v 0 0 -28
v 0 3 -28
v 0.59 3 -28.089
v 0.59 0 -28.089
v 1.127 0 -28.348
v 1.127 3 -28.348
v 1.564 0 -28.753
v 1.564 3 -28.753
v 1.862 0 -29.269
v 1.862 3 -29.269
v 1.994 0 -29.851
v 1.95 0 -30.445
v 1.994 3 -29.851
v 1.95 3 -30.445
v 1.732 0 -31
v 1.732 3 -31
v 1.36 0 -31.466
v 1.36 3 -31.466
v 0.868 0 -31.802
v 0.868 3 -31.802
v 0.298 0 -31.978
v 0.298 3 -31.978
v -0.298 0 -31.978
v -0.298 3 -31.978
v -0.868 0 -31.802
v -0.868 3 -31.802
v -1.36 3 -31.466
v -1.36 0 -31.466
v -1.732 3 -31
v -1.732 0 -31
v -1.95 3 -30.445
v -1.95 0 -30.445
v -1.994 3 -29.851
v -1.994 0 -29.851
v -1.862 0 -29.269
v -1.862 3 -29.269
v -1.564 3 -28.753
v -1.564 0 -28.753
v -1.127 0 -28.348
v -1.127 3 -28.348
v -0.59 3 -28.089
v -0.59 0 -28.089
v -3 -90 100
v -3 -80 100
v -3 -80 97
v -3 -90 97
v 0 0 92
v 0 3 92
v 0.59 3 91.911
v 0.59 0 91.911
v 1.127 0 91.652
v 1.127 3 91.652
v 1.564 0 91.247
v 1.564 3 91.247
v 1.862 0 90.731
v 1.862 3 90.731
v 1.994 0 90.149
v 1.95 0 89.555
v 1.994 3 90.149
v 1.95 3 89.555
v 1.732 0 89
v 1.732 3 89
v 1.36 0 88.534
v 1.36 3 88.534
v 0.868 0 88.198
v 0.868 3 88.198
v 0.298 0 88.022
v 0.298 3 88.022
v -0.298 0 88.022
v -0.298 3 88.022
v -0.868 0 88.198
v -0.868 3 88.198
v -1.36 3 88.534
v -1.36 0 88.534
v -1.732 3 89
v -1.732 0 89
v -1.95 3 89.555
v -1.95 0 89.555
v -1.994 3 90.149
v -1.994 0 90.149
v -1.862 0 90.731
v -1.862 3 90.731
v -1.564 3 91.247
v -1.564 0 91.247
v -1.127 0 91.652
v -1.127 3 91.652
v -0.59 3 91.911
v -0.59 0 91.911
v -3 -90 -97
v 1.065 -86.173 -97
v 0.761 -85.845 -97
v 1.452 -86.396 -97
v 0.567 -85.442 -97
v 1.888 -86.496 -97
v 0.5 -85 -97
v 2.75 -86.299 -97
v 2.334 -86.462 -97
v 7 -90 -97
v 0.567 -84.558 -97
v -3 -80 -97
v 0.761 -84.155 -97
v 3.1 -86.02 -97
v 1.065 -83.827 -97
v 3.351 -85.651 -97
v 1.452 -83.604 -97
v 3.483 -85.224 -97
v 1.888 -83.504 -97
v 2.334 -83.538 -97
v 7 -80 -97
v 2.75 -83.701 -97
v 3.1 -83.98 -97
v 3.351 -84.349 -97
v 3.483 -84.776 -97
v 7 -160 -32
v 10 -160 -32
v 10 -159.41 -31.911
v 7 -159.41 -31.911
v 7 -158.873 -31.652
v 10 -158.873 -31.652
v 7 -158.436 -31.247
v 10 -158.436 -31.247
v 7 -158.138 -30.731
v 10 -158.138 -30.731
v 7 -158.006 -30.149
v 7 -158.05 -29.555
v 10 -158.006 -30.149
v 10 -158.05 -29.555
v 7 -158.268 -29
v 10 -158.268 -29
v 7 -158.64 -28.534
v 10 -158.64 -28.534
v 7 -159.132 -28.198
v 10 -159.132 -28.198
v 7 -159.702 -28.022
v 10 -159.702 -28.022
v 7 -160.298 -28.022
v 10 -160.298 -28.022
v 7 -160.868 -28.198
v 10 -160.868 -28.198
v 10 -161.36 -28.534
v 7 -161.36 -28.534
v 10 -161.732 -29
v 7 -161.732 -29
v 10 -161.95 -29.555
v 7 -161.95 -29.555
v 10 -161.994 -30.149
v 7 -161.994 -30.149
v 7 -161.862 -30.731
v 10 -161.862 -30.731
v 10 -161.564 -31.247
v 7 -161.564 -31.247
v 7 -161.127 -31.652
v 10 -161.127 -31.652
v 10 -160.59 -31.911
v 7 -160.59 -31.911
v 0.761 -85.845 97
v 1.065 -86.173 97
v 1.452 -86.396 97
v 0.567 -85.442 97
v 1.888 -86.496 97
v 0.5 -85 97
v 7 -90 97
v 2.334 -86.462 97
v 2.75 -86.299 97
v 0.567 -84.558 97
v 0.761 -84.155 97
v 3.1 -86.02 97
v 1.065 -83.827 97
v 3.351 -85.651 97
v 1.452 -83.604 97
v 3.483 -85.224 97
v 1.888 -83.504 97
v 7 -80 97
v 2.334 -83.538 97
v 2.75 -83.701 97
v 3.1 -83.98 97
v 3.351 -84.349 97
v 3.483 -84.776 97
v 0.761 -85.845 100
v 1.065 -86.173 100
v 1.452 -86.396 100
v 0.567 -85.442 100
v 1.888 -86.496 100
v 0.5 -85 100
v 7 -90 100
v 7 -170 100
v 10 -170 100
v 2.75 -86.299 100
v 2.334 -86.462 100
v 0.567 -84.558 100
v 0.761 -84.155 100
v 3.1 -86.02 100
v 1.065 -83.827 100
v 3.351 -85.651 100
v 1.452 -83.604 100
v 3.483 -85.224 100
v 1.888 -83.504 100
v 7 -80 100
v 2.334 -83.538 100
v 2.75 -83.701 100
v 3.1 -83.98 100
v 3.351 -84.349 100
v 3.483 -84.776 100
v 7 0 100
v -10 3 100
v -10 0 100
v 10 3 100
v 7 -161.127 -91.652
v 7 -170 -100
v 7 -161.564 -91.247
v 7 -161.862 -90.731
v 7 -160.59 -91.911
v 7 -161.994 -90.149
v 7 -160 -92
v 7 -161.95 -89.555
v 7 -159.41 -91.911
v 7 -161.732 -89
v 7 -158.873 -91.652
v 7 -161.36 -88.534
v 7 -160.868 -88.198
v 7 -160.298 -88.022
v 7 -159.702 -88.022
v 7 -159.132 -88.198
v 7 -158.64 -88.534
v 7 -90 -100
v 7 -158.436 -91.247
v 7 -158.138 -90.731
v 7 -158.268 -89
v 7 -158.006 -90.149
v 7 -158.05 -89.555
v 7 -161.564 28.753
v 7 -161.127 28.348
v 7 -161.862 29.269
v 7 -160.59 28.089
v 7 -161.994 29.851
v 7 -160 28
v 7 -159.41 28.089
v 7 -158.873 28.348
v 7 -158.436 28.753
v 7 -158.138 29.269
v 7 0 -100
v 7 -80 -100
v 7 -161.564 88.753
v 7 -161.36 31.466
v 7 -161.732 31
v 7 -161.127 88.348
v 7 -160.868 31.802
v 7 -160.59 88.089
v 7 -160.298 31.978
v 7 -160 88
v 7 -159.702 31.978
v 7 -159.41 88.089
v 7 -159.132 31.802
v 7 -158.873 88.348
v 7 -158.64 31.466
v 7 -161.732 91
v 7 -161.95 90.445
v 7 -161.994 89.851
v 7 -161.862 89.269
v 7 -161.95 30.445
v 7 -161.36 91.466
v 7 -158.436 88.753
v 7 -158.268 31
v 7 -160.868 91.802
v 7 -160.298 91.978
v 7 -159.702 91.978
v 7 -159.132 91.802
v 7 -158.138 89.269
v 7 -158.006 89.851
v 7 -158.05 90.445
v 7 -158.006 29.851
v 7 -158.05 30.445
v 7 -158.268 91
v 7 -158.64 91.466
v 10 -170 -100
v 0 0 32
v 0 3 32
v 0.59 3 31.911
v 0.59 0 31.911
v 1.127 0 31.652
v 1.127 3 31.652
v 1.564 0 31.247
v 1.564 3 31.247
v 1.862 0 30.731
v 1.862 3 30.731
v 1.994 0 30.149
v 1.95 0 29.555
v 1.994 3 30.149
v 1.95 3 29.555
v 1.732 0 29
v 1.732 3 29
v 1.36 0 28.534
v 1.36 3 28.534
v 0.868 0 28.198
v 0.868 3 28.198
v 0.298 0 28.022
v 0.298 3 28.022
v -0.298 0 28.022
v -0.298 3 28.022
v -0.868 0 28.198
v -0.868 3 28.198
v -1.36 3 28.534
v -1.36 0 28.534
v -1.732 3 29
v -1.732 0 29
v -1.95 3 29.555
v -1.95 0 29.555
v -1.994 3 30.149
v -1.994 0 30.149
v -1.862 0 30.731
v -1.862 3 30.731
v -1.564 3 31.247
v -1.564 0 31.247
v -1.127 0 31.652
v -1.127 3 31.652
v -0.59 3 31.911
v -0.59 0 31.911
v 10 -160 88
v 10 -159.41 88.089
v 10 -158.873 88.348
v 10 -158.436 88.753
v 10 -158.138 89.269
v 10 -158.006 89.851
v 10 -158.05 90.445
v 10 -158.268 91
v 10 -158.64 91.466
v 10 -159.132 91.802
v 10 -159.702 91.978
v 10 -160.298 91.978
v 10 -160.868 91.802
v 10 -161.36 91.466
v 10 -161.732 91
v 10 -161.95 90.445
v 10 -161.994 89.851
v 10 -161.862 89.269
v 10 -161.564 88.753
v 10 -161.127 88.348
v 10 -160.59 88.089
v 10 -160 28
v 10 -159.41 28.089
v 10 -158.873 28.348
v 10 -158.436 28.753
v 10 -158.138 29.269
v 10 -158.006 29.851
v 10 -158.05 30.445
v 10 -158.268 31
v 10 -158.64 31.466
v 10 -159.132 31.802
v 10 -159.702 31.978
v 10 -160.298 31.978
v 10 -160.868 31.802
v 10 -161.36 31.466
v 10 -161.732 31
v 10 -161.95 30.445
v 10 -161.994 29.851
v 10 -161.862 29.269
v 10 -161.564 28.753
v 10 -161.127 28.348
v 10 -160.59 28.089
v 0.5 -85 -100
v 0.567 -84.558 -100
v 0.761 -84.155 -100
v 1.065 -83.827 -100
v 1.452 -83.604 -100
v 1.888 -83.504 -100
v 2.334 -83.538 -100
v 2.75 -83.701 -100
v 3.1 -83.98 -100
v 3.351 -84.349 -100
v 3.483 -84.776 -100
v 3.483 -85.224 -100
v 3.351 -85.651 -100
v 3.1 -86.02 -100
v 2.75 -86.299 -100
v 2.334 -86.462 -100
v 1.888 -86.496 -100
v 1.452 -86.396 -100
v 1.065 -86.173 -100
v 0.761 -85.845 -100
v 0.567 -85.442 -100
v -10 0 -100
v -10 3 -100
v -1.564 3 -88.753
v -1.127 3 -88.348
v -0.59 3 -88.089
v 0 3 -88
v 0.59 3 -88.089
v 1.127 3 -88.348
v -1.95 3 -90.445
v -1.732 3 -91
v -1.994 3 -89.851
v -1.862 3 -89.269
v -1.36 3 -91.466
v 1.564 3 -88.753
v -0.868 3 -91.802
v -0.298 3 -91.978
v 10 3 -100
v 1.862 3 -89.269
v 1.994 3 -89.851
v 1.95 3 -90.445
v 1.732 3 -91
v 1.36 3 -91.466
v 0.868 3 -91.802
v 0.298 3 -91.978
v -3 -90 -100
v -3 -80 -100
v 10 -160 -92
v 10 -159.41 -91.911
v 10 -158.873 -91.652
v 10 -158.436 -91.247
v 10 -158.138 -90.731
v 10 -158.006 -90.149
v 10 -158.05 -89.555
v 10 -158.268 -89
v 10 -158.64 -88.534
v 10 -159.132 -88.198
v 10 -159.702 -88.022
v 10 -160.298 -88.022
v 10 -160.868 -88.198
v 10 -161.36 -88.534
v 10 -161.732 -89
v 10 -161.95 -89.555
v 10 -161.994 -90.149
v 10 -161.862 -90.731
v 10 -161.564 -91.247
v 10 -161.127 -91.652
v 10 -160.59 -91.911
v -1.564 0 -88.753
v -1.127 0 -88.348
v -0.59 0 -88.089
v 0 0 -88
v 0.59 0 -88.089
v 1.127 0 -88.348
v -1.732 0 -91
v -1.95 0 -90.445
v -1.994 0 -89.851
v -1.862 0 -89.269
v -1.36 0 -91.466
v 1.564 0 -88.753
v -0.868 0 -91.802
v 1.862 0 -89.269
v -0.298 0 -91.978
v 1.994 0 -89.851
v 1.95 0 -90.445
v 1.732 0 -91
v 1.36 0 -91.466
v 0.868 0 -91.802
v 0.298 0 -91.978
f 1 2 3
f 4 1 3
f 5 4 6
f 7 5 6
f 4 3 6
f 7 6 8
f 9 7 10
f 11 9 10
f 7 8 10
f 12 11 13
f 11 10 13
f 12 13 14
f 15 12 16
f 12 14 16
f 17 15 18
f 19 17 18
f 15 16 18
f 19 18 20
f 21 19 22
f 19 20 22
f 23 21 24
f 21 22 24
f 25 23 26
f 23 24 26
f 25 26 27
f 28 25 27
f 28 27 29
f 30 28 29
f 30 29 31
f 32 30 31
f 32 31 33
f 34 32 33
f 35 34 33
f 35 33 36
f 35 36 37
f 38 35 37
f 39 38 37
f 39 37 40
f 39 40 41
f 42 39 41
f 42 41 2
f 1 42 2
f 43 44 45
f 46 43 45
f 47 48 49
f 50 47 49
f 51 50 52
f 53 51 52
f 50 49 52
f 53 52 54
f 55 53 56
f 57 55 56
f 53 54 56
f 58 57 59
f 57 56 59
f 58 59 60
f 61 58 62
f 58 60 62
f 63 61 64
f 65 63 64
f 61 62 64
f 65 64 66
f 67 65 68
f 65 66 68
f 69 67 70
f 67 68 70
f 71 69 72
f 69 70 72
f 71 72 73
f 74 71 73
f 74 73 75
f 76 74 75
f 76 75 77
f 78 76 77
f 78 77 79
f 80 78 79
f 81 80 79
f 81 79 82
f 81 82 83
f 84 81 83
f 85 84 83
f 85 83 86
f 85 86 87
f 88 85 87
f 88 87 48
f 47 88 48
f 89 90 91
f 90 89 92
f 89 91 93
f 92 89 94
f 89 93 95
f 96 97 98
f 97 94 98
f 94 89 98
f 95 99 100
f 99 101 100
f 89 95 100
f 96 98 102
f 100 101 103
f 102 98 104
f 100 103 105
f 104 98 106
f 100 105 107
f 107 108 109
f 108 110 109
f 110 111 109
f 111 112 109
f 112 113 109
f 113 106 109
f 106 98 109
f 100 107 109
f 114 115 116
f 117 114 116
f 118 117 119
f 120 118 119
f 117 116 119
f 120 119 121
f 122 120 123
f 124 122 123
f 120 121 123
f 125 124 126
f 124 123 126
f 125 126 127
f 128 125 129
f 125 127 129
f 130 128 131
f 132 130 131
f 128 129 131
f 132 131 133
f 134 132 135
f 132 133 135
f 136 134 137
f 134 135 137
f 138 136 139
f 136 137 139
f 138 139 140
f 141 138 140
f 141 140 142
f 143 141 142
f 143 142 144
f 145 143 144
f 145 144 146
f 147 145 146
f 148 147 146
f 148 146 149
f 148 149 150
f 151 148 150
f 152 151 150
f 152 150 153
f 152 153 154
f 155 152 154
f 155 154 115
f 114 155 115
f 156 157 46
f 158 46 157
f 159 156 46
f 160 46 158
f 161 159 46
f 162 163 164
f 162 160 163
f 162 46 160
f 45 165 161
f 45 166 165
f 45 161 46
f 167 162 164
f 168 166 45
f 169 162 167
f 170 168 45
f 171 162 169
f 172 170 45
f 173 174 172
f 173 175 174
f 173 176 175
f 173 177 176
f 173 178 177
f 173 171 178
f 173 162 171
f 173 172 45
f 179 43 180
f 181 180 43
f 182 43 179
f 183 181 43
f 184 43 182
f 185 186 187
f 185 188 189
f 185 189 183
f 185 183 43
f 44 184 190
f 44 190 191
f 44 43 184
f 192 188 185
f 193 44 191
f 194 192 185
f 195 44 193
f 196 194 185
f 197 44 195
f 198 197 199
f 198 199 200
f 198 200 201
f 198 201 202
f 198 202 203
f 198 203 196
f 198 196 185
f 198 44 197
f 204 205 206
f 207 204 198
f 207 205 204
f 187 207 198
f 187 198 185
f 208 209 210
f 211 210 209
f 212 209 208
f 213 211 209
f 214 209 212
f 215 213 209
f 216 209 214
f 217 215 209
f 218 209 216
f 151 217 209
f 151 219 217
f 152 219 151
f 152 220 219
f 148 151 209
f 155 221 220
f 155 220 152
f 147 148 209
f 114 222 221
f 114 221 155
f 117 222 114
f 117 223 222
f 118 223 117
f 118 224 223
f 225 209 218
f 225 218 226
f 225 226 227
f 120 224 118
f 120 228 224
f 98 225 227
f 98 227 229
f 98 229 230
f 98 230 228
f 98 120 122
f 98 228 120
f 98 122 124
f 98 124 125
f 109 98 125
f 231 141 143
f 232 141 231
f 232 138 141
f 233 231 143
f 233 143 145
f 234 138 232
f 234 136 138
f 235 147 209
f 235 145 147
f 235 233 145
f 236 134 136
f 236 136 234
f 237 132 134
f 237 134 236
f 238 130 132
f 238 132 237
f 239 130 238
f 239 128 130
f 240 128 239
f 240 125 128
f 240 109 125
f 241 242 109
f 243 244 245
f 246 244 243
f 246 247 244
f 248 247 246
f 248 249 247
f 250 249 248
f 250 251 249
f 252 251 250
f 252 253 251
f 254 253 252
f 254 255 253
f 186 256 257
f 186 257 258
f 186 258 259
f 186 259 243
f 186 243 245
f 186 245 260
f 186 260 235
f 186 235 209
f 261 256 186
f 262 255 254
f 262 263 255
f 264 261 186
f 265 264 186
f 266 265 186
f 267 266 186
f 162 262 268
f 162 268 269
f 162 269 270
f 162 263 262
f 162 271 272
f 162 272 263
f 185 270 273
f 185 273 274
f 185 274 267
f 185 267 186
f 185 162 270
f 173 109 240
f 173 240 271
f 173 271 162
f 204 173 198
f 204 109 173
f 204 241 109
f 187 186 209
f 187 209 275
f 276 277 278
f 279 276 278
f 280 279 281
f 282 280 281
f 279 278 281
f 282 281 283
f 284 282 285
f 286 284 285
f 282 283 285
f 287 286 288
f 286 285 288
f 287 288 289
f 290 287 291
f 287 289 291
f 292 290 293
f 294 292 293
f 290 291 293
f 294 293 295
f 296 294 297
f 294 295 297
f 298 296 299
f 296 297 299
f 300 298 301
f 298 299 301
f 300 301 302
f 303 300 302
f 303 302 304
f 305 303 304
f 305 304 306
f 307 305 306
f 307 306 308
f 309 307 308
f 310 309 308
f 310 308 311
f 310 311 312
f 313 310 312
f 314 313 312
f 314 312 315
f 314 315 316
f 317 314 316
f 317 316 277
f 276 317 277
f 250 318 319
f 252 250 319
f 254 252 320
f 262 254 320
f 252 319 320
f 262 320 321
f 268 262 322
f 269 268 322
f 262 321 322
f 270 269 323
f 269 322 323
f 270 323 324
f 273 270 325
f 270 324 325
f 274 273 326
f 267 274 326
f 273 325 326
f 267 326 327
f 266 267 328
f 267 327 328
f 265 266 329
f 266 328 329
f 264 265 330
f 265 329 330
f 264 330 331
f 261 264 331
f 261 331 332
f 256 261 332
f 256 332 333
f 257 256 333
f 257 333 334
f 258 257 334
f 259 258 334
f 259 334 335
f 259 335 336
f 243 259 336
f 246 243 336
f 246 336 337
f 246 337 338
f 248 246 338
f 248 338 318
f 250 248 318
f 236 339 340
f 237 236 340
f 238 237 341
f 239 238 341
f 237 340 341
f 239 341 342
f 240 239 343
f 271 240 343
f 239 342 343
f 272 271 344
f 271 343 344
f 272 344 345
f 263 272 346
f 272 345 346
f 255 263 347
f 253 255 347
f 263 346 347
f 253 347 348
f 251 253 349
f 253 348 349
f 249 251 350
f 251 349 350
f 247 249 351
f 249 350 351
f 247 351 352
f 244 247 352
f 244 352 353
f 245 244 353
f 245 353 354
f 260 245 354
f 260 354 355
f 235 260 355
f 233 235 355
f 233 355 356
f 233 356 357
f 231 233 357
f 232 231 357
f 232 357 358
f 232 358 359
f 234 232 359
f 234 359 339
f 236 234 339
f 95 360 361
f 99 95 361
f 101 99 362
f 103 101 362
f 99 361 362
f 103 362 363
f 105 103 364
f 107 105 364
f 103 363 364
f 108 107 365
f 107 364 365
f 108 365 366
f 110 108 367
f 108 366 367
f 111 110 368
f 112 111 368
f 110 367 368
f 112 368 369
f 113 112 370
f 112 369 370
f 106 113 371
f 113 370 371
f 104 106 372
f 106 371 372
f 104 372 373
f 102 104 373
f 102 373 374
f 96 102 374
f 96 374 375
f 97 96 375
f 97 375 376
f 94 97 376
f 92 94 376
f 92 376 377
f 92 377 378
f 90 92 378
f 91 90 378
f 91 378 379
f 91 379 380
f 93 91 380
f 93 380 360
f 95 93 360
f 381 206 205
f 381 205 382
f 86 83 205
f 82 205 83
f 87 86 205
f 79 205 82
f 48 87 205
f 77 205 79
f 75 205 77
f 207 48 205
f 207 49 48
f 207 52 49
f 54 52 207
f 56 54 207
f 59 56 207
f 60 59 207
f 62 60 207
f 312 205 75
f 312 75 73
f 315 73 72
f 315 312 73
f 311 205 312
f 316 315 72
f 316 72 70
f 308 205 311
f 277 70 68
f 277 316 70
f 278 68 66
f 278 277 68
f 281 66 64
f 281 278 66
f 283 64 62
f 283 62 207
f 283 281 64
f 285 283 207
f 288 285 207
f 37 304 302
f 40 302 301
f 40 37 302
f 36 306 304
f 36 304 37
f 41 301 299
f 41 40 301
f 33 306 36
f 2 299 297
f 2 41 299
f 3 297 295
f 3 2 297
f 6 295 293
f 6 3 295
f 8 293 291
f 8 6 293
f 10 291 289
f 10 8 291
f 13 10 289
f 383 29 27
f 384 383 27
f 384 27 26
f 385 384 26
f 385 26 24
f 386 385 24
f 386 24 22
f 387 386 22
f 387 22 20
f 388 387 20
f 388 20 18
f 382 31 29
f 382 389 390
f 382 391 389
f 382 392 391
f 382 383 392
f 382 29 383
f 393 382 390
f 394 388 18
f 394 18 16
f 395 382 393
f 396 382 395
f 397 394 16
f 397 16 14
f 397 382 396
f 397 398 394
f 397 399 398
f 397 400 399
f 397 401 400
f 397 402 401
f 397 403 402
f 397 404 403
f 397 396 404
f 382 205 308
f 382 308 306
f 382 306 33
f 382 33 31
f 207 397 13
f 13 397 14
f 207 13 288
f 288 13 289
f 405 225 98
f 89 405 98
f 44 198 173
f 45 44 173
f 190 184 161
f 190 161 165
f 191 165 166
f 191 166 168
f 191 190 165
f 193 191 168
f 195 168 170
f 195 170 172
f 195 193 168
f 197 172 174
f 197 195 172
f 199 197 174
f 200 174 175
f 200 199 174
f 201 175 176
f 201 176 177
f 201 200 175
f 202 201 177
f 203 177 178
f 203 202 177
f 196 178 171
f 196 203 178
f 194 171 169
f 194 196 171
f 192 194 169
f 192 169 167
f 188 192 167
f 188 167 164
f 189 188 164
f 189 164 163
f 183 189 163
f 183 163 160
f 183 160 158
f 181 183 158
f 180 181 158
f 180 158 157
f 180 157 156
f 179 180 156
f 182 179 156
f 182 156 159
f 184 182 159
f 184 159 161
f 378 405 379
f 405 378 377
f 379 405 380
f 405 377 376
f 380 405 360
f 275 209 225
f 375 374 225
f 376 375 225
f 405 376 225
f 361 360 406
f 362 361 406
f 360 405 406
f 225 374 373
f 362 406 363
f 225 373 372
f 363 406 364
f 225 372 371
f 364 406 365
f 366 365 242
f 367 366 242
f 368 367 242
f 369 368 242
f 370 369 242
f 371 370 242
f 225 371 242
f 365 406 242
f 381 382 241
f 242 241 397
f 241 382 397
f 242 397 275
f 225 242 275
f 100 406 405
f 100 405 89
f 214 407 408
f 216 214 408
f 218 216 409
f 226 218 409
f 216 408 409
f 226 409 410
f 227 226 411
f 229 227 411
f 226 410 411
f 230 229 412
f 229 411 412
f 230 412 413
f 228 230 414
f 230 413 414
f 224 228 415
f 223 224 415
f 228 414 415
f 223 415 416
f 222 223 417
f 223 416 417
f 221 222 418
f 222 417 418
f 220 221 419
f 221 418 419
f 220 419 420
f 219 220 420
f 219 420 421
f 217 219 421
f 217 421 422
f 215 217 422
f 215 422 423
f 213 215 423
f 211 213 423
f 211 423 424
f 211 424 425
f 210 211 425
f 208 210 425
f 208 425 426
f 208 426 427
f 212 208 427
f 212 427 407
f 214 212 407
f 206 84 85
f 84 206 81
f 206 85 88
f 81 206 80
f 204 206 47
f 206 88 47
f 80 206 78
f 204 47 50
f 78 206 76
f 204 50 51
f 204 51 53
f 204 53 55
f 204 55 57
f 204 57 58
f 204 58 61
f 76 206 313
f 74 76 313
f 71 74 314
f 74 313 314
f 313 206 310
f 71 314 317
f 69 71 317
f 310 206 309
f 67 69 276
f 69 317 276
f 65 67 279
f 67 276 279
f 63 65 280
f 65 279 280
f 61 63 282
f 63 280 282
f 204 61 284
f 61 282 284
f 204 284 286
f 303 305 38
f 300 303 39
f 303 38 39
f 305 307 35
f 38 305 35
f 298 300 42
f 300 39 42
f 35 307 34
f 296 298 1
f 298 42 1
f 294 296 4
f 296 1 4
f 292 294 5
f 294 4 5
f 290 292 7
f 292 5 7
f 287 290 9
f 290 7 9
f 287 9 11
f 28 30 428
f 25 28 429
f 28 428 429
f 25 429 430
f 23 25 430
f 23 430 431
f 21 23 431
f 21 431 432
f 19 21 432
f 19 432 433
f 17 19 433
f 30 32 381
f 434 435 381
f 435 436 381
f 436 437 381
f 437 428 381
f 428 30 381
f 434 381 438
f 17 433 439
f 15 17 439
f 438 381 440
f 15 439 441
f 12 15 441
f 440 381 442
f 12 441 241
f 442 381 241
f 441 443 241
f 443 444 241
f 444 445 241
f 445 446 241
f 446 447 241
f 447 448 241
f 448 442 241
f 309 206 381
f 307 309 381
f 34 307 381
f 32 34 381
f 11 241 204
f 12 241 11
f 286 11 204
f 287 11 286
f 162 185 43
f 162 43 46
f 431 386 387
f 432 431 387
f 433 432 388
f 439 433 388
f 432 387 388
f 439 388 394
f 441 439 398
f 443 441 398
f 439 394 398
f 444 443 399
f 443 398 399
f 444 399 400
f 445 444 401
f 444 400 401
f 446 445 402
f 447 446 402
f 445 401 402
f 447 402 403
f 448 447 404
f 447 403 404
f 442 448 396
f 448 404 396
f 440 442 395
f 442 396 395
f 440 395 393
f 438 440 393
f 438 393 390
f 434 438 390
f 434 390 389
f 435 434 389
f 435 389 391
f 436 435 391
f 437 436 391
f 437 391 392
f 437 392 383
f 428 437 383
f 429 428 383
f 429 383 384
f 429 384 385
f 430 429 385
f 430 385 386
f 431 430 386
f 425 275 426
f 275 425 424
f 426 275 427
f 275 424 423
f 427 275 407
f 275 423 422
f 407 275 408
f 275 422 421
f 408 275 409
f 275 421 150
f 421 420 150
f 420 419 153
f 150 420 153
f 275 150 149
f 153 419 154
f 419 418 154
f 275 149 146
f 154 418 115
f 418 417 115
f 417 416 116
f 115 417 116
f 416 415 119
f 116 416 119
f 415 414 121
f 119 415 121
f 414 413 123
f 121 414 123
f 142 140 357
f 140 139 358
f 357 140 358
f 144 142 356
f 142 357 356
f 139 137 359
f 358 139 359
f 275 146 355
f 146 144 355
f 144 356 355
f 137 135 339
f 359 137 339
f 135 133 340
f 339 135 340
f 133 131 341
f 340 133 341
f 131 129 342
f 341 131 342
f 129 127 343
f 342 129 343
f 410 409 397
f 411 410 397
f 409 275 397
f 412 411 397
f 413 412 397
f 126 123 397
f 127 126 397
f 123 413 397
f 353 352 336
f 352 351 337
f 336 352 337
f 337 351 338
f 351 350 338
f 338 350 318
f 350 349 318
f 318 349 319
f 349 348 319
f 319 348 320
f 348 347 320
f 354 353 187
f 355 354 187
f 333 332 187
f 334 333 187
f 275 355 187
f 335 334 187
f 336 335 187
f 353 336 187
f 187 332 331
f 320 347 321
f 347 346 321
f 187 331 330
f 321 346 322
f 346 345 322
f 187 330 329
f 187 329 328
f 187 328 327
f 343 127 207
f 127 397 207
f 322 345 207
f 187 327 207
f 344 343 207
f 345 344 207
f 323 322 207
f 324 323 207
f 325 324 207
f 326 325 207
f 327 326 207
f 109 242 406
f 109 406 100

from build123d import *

# Parameters (mm, degrees)
SKETCH1_W           = 20
SKETCH1_H           = 200
BOSS_EXTRUDE1_DEPTH = 3
SKETCH2_W           = 3
SKETCH2_H           = 200
BOSS_EXTRUDE2_DEPTH = 170
CUT_EXTRUDE1_REACH  = 202.072
SKETCH3_R           = 2
LPATTERN1_COUNT     = 4
LPATTERN1_PITCH     = 60
CUT_EXTRUDE2_REACH  = 200.242
SKETCH4_R           = 2
LPATTERN2_COUNT     = 4
LPATTERN2_PITCH     = 60
SKETCH5_W           = 3
SKETCH5_H           = 10
BOSS_EXTRUDE3_DEPTH = 10
CUT_EXTRUDE3_REACH  = 264.679
SKETCH6_R           = 1.5


with BuildPart() as part:
    # Sketch1 → Boss-Extrude1 (new body)
    with BuildSketch(Plane(origin=(0, 0, 0), x_dir=(1, 0, 0), z_dir=(0, 1, 0))):
        Rectangle(SKETCH1_W, SKETCH1_H)
    extrude(amount=BOSS_EXTRUDE1_DEPTH)

    # Sketch2 → Boss-Extrude2 (add)
    with BuildSketch(Plane.XZ):
        with Locations((8.5, 0)):
            Rectangle(SKETCH2_W, SKETCH2_H)
    extrude(amount=BOSS_EXTRUDE2_DEPTH)

    # Sketch3 → Cut-Extrude1 (cut, up to next)
    with BuildSketch(Plane(origin=(0, 3, 0), x_dir=(1, 0, 0), z_dir=(0, 1, 0)), mode=Mode.PRIVATE) as cut_extrude1_sk1:
        with Locations(Location((0, -90, 0), (0, 0, 270))):
            Circle(SKETCH3_R)
    cut_extrude1_tool1 = extrude(cut_extrude1_sk1.sketch, amount=-CUT_EXTRUDE1_REACH, mode=Mode.PRIVATE) & part.part
    cut_extrude1 = cut_extrude1_tool1.solids().sort_by_distance((0, 3, 90))[0]
    add(cut_extrude1, mode=Mode.SUBTRACT)

    # LPattern1: Cut-Extrude1 ×4
    with Locations(*[(0, 0, -i * LPATTERN1_PITCH) for i in range(1, LPATTERN1_COUNT)]):
        add(cut_extrude1, mode=Mode.SUBTRACT)

    # Sketch4 → Cut-Extrude2 (cut, up to next)
    with BuildSketch(Plane(origin=(10, 0, 0), x_dir=(0, 0, -1), z_dir=(1, 0, 0)), mode=Mode.PRIVATE) as cut_extrude2_sk1:
        with Locations((90, -160)):
            Circle(SKETCH4_R)
    cut_extrude2_tool1 = extrude(cut_extrude2_sk1.sketch, amount=-CUT_EXTRUDE2_REACH, mode=Mode.PRIVATE) & part.part
    cut_extrude2 = cut_extrude2_tool1.solids().sort_by_distance((10, -160, -90))[0]
    add(cut_extrude2, mode=Mode.SUBTRACT)

    # LPattern2: Cut-Extrude2 ×4
    with Locations(*[(0, 0, i * LPATTERN2_PITCH) for i in range(1, LPATTERN2_COUNT)]):
        add(cut_extrude2, mode=Mode.SUBTRACT)

    # Sketch5 → Boss-Extrude3 (add)
    with BuildSketch(Plane.ZY.offset(-7)):
        with Locations((-98.5, -85)):
            Rectangle(SKETCH5_W, SKETCH5_H)
    boss_extrude3 = extrude(amount=BOSS_EXTRUDE3_DEPTH)

    # Sketch6 → Cut-Extrude3 (cut, up to next)
    with BuildSketch(Plane(origin=(0, 0, -100), x_dir=(-1, 0, 0), z_dir=(0, 0, -1)), mode=Mode.PRIVATE) as cut_extrude3_sk1:
        with Locations((-2, -85)):
            Circle(SKETCH6_R)
    cut_extrude3_tool1 = extrude(cut_extrude3_sk1.sketch, amount=-CUT_EXTRUDE3_REACH, mode=Mode.PRIVATE) & part.part
    cut_extrude3 = cut_extrude3_tool1.solids().sort_by_distance((2, -85, -100))[0]
    add(cut_extrude3, mode=Mode.SUBTRACT)

    # Mirror1: Boss-Extrude3, Cut-Extrude3 across plane
    add(boss_extrude3.mirror(Plane.XY))
    add(cut_extrude3.mirror(Plane.XY), mode=Mode.SUBTRACT)


solid = part.part
